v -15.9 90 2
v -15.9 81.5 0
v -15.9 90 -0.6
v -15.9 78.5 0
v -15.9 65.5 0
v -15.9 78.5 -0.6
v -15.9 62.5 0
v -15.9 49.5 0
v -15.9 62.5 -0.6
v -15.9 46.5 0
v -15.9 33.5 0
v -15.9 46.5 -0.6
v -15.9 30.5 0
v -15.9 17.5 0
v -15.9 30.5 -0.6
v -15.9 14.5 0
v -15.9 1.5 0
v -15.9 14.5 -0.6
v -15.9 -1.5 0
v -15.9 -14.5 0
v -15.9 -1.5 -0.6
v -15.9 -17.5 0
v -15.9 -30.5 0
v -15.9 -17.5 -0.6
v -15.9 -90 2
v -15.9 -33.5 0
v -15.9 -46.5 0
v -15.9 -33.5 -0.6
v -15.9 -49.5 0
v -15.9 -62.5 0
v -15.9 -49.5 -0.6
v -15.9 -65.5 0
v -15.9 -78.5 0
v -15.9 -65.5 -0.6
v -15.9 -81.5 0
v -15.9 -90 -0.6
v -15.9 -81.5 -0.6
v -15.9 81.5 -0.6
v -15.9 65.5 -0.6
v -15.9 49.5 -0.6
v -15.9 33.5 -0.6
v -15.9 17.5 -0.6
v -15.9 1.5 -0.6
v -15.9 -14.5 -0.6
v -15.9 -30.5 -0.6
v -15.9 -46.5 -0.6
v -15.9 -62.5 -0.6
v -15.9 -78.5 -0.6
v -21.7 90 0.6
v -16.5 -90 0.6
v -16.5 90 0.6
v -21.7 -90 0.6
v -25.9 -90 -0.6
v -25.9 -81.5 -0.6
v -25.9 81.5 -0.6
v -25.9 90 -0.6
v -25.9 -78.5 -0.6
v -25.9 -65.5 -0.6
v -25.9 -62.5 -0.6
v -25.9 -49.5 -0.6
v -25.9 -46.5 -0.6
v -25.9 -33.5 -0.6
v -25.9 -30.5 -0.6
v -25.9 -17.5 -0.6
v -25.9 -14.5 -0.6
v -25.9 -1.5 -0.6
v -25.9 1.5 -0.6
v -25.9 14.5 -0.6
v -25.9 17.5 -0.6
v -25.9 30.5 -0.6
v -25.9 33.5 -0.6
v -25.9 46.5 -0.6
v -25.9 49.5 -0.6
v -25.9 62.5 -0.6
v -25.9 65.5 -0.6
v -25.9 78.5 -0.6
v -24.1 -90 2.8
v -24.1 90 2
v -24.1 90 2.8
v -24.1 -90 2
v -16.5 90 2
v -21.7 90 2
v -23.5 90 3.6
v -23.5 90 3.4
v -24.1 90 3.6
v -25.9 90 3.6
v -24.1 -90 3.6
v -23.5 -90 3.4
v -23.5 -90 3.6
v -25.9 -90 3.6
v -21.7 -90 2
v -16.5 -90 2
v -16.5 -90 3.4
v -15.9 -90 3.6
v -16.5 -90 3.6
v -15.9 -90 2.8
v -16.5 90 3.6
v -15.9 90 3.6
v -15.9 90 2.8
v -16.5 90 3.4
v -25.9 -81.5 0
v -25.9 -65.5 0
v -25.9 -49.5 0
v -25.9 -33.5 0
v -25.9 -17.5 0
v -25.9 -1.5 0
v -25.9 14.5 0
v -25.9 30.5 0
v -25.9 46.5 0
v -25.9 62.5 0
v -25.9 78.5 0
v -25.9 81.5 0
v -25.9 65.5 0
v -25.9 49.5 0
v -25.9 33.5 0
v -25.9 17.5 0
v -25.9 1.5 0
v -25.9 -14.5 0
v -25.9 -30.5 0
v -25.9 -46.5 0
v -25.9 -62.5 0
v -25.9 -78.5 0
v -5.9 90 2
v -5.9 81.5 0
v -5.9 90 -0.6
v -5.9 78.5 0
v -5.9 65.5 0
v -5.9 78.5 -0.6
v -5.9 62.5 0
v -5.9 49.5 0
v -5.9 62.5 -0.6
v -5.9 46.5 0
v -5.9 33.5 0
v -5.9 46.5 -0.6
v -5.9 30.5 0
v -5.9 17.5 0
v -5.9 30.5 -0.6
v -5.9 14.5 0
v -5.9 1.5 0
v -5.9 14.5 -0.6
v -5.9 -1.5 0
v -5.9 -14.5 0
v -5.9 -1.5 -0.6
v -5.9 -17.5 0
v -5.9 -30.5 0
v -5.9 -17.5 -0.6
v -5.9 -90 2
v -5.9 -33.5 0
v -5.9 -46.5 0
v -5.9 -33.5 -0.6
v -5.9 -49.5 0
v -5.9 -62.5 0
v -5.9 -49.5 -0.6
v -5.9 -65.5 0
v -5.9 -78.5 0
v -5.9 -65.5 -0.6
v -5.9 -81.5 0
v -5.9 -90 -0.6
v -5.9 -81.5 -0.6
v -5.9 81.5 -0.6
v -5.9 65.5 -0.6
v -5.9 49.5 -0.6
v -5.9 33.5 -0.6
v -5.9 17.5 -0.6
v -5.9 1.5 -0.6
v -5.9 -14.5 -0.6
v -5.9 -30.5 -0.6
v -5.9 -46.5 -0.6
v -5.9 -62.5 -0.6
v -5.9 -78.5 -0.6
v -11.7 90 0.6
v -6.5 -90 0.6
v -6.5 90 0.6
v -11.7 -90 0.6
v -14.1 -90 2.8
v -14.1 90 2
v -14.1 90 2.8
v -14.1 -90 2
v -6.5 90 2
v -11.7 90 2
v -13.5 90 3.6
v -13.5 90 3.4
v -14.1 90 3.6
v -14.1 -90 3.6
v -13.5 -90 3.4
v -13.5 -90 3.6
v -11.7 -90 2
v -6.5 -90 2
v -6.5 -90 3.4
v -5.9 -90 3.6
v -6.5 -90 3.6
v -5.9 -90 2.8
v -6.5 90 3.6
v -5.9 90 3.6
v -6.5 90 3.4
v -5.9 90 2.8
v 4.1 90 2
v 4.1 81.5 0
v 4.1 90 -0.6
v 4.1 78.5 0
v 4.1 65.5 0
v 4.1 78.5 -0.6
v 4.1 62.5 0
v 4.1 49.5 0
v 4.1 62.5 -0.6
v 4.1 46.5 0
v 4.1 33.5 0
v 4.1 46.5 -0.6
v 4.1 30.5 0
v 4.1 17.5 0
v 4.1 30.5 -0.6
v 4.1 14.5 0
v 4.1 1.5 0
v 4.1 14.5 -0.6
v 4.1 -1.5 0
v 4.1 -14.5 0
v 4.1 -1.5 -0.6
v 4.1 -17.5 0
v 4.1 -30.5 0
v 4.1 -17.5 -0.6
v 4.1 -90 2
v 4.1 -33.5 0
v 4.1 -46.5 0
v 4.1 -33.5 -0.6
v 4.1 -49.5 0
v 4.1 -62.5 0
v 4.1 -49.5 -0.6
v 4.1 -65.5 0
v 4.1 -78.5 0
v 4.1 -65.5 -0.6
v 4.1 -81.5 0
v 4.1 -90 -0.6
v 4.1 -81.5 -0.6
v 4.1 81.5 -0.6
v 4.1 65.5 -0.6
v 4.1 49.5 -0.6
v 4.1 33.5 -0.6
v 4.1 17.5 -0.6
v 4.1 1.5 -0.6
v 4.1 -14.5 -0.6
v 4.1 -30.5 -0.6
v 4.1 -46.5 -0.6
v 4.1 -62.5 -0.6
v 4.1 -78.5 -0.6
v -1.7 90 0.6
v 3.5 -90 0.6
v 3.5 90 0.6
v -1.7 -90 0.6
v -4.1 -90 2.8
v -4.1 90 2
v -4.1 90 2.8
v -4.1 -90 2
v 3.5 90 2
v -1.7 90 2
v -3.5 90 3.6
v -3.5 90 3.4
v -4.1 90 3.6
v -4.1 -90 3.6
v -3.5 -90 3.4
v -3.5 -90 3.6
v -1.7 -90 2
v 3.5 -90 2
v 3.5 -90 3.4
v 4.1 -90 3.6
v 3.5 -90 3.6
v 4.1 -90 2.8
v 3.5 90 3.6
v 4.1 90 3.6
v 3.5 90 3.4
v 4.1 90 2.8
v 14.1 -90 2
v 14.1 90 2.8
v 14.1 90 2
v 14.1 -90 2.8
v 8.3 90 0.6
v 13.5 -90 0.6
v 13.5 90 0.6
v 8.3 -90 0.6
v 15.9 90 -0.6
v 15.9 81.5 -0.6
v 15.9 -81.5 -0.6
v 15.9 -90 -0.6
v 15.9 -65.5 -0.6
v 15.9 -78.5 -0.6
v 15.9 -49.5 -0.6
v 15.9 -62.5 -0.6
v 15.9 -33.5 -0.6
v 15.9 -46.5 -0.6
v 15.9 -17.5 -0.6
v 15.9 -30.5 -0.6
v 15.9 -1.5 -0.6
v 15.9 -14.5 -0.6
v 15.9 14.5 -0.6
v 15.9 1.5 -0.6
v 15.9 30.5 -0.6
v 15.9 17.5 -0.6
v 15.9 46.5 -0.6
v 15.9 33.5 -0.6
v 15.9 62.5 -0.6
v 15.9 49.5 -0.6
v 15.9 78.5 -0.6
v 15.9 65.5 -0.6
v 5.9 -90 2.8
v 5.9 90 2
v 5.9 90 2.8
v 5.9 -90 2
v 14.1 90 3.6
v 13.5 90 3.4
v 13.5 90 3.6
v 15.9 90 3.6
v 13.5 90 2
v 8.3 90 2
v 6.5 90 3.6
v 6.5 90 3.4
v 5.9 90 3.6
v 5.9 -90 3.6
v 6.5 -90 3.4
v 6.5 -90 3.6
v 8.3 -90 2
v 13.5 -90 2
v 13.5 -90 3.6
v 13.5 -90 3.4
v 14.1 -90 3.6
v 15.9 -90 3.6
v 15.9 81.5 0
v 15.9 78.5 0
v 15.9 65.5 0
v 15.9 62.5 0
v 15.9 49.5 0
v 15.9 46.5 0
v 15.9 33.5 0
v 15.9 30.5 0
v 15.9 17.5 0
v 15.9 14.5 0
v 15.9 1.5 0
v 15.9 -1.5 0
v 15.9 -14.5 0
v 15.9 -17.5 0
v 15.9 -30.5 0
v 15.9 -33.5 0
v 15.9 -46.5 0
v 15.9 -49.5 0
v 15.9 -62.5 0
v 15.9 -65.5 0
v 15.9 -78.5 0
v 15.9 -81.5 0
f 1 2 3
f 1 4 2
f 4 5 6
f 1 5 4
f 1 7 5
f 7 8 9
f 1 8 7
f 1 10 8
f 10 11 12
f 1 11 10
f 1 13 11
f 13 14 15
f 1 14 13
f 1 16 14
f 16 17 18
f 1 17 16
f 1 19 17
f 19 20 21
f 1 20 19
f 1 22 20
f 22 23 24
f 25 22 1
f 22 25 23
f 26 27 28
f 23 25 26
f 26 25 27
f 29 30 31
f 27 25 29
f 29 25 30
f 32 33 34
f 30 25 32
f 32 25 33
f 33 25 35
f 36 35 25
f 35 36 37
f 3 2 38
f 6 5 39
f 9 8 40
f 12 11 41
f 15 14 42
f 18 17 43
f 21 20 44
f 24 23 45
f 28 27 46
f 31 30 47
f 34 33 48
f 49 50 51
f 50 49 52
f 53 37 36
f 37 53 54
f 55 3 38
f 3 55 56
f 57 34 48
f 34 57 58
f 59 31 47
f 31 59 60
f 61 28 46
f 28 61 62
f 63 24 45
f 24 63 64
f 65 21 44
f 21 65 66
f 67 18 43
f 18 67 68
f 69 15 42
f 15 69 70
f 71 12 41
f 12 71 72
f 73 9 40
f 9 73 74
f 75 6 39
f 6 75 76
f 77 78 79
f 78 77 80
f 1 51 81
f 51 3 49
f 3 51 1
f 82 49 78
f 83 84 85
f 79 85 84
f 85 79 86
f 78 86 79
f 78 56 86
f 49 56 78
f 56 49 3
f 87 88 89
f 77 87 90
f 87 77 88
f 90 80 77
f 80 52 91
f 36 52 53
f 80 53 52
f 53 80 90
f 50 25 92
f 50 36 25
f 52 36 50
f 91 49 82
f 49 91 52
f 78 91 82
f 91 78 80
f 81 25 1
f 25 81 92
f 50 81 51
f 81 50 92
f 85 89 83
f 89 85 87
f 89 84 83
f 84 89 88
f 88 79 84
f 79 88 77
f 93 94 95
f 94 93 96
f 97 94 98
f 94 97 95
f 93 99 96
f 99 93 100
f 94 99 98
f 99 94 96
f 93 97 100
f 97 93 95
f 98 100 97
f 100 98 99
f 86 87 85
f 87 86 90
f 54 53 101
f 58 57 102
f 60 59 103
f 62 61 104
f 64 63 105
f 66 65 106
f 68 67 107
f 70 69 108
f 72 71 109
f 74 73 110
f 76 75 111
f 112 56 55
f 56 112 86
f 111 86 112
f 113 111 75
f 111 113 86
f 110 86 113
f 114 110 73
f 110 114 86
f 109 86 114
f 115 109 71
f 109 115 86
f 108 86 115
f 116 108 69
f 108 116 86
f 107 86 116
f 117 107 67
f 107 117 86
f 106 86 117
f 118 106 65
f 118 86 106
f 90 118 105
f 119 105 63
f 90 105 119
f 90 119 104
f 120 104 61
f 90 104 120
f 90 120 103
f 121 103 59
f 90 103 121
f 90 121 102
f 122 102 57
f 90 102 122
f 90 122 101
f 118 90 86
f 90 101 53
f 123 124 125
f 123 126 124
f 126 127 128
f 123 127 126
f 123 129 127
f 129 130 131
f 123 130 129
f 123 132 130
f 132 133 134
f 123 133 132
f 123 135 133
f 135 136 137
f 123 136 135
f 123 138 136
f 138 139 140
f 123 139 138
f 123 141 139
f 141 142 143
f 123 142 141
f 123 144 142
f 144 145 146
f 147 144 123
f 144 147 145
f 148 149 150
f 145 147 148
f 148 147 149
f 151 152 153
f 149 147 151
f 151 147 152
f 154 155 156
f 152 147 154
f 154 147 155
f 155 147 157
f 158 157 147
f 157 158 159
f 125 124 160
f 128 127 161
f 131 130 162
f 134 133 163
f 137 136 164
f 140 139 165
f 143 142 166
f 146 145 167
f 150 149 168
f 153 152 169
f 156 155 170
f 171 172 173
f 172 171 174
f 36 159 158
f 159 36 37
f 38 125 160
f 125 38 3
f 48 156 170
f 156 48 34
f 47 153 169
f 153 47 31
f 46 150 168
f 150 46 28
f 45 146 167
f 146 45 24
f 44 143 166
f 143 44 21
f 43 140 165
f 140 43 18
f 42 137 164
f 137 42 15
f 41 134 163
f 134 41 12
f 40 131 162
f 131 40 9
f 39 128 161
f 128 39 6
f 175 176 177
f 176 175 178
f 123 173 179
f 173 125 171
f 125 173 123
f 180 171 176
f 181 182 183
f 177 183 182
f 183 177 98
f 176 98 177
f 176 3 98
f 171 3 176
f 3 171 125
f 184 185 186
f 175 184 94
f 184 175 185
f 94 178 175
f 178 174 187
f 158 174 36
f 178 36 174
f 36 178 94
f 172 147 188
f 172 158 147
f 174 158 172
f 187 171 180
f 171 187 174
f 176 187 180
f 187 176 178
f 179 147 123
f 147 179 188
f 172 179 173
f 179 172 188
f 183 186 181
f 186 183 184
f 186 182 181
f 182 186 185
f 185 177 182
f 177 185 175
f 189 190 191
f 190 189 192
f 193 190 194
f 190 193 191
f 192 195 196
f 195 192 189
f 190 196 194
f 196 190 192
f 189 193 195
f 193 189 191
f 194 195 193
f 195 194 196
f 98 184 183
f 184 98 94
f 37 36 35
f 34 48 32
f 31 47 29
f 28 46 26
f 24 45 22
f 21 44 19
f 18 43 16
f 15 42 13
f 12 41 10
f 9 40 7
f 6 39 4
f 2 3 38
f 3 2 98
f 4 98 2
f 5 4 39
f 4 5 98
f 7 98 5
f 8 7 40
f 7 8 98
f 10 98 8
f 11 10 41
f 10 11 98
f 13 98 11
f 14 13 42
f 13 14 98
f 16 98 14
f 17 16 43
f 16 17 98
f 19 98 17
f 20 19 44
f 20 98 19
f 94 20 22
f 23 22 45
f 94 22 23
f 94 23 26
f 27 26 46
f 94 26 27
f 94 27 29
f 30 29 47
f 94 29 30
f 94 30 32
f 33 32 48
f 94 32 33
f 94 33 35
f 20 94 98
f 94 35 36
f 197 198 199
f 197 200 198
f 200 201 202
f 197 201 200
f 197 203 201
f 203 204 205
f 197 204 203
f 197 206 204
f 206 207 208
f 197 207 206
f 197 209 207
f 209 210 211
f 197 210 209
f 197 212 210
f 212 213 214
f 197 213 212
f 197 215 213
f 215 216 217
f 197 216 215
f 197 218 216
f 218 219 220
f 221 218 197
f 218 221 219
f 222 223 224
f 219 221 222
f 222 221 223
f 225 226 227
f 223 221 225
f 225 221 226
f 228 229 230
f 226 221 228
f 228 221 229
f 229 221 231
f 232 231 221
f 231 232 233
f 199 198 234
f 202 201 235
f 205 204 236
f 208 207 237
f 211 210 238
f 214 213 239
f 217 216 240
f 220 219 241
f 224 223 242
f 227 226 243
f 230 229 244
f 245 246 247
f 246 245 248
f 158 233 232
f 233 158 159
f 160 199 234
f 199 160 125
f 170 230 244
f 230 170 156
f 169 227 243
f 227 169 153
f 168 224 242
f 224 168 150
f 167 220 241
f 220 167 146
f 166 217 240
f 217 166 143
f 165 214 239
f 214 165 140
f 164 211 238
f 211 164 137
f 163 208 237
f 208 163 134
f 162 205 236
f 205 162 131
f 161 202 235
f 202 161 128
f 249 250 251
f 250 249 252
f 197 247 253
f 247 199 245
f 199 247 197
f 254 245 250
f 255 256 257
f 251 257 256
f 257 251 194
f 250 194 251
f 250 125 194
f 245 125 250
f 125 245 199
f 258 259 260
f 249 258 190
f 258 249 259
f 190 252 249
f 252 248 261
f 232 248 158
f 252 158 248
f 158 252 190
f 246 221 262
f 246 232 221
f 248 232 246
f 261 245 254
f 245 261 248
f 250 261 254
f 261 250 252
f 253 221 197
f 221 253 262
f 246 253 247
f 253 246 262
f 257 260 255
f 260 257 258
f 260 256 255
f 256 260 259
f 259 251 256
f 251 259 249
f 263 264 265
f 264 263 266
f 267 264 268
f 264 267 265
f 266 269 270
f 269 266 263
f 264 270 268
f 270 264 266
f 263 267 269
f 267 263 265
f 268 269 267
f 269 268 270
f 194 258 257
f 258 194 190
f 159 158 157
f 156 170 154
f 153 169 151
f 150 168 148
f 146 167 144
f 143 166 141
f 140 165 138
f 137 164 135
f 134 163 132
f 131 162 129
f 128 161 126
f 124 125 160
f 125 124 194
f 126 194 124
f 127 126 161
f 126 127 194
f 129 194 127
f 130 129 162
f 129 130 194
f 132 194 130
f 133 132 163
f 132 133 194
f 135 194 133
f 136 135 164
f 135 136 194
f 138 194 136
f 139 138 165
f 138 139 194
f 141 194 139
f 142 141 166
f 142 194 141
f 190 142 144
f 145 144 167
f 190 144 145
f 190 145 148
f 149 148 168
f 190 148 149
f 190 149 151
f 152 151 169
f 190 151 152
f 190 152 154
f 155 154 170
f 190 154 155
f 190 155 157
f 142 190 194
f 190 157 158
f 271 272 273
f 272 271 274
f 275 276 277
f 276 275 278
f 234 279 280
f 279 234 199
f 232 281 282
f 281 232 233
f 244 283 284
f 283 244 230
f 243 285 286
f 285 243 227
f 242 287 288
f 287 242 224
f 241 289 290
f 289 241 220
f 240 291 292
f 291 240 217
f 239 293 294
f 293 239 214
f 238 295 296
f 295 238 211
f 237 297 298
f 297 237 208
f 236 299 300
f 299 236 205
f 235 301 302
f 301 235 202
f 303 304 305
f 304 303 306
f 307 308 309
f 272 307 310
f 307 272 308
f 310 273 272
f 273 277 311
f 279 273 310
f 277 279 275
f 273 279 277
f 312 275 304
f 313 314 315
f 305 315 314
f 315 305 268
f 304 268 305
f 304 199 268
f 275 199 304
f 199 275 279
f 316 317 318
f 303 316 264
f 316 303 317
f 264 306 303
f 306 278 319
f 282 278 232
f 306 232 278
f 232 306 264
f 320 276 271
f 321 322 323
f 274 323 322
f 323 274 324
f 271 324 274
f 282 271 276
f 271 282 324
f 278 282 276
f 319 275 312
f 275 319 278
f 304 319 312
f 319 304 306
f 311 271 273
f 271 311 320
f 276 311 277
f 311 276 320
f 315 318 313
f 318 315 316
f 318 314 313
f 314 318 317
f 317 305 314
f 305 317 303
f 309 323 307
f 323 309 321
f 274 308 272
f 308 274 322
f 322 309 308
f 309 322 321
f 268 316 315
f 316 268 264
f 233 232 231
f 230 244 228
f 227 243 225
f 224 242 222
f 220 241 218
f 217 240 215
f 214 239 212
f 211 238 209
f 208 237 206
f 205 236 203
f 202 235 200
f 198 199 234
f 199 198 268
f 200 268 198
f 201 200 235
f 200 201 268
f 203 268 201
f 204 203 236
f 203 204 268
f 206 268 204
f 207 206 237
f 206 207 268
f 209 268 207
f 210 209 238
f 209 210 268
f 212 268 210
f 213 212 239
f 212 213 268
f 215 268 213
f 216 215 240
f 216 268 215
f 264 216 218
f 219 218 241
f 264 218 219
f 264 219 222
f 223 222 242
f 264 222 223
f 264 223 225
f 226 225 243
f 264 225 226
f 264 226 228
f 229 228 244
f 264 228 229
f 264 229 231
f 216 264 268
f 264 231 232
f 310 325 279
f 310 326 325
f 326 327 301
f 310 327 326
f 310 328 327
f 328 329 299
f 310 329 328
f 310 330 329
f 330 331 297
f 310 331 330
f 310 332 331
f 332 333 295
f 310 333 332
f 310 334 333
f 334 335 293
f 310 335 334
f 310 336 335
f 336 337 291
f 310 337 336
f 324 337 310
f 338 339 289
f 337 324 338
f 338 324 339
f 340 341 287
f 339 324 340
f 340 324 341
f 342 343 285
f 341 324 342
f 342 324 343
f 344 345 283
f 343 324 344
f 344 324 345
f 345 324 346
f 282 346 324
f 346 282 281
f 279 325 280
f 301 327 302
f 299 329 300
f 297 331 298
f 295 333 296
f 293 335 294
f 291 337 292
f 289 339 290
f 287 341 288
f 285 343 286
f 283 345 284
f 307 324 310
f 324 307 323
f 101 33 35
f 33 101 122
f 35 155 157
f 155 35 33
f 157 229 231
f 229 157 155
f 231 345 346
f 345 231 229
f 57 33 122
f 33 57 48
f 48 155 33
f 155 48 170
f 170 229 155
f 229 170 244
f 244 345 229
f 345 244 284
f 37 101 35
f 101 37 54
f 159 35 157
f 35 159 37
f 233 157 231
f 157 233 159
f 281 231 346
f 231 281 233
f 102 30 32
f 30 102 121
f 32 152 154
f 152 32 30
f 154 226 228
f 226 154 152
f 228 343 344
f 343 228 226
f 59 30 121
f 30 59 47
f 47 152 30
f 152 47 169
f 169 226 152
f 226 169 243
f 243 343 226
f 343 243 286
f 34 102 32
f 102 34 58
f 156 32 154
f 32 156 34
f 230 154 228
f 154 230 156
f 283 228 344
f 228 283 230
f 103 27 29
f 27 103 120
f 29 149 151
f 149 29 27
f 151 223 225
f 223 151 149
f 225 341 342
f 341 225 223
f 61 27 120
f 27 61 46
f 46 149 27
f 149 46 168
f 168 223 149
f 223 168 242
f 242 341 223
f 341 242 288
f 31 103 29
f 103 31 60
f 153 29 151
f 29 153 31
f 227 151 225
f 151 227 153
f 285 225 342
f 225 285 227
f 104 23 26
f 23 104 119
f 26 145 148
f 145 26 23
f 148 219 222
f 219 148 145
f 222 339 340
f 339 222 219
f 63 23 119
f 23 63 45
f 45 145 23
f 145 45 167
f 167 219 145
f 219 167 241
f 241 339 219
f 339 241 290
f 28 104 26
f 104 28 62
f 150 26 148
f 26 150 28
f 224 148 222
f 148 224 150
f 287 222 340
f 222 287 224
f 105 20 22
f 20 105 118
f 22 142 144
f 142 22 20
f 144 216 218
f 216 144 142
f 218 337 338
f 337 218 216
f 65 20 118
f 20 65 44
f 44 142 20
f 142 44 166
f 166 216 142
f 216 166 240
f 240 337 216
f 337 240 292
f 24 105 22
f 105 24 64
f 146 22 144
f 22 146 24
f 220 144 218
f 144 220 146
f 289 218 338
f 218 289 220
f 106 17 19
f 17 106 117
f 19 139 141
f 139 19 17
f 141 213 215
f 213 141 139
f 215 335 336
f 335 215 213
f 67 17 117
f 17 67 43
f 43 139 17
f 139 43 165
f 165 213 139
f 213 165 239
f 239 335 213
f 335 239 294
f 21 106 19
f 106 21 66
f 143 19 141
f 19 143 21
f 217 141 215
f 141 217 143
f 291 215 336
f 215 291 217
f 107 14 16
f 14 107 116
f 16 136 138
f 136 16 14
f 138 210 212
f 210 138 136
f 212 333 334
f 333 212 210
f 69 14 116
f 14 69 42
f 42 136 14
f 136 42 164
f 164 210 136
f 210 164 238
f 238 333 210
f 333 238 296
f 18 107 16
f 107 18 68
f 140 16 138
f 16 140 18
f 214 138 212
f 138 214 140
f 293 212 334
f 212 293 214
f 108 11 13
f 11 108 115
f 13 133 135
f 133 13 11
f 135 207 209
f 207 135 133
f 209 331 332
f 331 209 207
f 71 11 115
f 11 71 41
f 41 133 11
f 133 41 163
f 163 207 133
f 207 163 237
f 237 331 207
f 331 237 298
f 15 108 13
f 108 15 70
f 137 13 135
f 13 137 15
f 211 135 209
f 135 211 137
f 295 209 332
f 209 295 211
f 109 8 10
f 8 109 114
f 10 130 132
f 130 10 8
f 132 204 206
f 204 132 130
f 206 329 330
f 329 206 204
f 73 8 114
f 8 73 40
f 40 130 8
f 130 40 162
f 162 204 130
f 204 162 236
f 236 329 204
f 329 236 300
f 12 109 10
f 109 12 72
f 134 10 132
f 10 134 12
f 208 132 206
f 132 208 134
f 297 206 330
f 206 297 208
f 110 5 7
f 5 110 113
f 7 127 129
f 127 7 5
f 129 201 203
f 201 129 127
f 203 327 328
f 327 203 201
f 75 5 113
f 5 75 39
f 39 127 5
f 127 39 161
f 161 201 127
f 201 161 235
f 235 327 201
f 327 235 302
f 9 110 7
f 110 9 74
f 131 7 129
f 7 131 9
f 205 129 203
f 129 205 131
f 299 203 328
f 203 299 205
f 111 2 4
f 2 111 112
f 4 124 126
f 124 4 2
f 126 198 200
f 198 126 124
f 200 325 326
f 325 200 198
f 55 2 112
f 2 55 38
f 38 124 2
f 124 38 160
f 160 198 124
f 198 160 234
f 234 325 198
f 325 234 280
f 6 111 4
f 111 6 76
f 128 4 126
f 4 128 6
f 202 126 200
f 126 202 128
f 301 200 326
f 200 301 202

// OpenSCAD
// length of tray
l=180;
// thickness of base
b=1.2;
// width of lane
w=8.2;
// number of lanes
n=4;
// height of groove
g=2.2;
// width of spacer
s=1.8;

module strip(){
rotate([90,0,0])
linear_extrude(height=l, center=true)
polygon([[0,0],[0,0.8],[0.6,0.8],[0.6,0.6]]);
}

module holder(){
cube([w,l,b],center=true);
translate([-w/2,-l/2,-b/2])
cube([0.6+1.8,l,b+g-0.8]);
translate([w/2-0.6,-l/2,-b/2])
cube([0.6,l,b+g-0.8]);
translate([-w/2,0,b/2+g])
strip();
mirror(0,1,0)
translate([-w/2,0,b/2+g])
strip();
}

module spacer(){
translate([0,0,(g+0.8)/2])
cube([s,l,b+g+0.8],center=true);
}

difference(){
union(){
for(i = [0:n-1]){
translate([i * (w+s) - (n*(w+s))/2,0,0]){
translate([-(w/2)-s/2,0,0])
spacer();
holder();
}}
translate([(w/2)+s/2 + (n-1)*(w+s) - (n*(w+s))/2,0,0])
spacer();
}
for(i = [-5:5])
translate([0,(l-20)/10 * i,-b/2])
cube([200,3,1.2],center=true);
}
